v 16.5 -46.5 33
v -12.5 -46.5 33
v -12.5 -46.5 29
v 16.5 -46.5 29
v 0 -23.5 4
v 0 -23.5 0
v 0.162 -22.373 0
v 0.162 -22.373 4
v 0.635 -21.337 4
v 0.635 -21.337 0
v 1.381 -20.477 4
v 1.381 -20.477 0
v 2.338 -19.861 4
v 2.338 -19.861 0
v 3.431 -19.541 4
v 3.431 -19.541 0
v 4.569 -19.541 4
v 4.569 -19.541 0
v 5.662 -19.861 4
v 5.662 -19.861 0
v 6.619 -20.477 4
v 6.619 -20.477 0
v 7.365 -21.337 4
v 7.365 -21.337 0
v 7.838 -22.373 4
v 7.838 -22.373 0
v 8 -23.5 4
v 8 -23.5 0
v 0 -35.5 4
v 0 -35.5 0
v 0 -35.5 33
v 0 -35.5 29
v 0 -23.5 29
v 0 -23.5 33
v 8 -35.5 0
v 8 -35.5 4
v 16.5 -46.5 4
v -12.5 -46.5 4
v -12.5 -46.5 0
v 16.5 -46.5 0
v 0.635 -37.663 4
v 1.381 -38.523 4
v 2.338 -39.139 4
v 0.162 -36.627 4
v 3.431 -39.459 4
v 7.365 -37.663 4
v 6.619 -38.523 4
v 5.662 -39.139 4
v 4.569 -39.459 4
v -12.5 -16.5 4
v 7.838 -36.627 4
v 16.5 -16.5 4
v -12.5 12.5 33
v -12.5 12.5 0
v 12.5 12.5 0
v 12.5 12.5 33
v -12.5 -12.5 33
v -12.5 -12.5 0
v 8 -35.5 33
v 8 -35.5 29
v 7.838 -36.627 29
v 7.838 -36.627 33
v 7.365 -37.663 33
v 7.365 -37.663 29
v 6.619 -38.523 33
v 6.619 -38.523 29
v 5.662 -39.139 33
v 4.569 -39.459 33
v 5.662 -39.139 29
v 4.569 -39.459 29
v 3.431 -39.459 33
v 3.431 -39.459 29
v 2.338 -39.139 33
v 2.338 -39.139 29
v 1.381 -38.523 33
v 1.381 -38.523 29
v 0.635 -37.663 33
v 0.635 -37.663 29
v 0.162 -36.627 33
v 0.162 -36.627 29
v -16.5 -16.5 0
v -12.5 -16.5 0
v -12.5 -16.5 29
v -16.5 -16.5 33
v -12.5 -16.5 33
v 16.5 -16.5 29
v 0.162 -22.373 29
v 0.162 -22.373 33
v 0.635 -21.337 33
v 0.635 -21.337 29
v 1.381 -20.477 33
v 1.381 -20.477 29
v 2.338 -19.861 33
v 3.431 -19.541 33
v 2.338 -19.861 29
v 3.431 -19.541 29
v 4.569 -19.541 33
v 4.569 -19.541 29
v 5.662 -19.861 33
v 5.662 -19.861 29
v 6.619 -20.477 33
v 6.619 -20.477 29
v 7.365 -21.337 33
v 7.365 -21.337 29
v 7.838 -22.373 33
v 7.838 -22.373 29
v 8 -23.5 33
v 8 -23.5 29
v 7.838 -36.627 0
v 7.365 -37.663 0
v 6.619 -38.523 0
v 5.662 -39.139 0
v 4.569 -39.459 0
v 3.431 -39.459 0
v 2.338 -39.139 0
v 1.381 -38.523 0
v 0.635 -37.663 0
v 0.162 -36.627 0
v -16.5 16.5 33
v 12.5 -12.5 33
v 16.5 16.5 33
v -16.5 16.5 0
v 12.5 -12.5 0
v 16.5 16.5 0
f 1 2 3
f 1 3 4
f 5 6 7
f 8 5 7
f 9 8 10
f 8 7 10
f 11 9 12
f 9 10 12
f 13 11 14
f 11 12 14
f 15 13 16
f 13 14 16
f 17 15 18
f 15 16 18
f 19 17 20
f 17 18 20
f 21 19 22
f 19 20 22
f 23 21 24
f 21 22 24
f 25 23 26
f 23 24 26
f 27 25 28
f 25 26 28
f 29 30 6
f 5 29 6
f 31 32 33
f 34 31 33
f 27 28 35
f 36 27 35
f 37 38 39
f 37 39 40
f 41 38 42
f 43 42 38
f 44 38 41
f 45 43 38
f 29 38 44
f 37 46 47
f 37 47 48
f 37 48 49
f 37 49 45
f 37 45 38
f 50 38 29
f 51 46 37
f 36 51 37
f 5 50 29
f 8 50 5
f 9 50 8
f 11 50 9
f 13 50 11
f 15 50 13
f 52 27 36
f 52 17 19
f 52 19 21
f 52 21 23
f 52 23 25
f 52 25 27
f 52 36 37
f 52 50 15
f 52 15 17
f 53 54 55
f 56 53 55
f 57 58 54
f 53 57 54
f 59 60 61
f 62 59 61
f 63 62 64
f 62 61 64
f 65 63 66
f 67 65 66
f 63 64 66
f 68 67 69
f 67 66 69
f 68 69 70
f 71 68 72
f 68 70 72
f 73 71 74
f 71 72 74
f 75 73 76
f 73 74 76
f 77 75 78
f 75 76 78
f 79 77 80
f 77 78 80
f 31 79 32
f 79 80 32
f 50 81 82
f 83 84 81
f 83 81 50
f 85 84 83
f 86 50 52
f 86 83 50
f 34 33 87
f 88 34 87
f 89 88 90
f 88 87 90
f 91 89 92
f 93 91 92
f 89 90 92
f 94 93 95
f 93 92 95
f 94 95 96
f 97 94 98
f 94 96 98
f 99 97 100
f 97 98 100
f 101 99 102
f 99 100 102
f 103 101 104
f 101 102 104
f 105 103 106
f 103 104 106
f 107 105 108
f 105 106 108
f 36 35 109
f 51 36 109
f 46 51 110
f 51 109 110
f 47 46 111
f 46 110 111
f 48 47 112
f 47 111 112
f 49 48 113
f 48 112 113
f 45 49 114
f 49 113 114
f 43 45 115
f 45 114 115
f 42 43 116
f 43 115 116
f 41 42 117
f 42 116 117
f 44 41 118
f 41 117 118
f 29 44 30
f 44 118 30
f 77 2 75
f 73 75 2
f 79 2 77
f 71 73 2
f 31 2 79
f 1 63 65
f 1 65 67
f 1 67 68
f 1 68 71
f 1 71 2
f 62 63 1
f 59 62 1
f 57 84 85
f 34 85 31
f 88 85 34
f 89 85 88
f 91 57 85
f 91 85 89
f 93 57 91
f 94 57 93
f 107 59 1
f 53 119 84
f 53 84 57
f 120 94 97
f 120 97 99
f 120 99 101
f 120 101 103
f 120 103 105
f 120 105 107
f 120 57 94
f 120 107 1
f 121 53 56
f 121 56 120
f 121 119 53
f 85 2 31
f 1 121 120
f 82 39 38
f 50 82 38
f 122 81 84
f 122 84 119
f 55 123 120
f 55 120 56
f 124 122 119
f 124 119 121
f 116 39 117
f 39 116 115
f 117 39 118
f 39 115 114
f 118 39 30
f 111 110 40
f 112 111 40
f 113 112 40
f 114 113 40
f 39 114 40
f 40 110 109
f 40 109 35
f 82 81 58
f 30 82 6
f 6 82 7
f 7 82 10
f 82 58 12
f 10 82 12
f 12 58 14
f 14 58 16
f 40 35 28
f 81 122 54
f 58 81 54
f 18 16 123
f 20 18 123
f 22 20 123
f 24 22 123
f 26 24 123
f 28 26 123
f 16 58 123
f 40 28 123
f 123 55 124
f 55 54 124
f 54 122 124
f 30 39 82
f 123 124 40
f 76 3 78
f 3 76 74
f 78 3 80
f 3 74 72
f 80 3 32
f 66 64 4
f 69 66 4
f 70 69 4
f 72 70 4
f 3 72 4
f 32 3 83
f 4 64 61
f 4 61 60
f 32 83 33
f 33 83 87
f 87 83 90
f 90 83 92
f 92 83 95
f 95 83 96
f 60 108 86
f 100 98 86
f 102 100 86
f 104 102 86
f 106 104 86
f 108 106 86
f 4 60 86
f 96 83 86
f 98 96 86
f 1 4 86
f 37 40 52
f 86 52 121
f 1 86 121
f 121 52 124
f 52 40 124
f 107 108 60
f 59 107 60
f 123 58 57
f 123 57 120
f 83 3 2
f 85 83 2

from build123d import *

# Parameters (mm, degrees)
SKETCH20_W                = 33
SKETCH20_H                = 33
SKETCH20_W_2              = 25
SKETCH20_H_2              = 25
BOSS_EXTRUDE12_DEPTH      = 33
BOSS_EXTRUDE13_DEPTH      = 30
BOSS_EXTRUDE13_DEPTH_BACK = 4
SKETCH22_W                = 33
SKETCH22_H                = 4
SKETCH23_W                = 4
SKETCH23_H                = 4
CUT_EXTRUDE10_DEPTH       = 30
CUT_EXTRUDE15_DEPTH       = 33


with BuildPart() as part:
    # Sketch20 → Boss-Extrude12 (new body)
    with BuildSketch(Plane.XY):
        Rectangle(SKETCH20_W, SKETCH20_H)
        Rectangle(SKETCH20_W_2, SKETCH20_H_2, mode=Mode.SUBTRACT)
    extrude(amount=BOSS_EXTRUDE12_DEPTH)

    # Sketch22 → Boss-Extrude13 (add, two sides: drawn at the far end of the back side and taken through both)
    with BuildSketch(Plane.XZ.offset(16.5).offset(-BOSS_EXTRUDE13_DEPTH_BACK)):
        with Locations((0, 31)):
            Rectangle(SKETCH22_W, SKETCH22_H)
        with Locations((0, 2)):
            Rectangle(SKETCH22_W, SKETCH22_H)
    extrude(amount=BOSS_EXTRUDE13_DEPTH + BOSS_EXTRUDE13_DEPTH_BACK)

    # Sketch23 → Cut-Extrude10 (cut)
    with BuildSketch(Plane.XZ.offset(46.5)):
        with Locations((-14.5, 31)):
            Rectangle(SKETCH23_W, SKETCH23_H)
        with Locations((-14.5, 2)):
            Rectangle(SKETCH23_W, SKETCH23_H)
    extrude(amount=-CUT_EXTRUDE10_DEPTH, mode=Mode.SUBTRACT)

    # Sketch36 → Cut-Extrude15 (cut)
    with BuildSketch(Plane(origin=(0, 0, 0), x_dir=(-1, 0, 0), z_dir=(0, 0, -1))):
        with BuildLine():
            Line((-8, -23.5), (-8, -35.5))
            ThreePointArc((-8, -35.5), (-4, -39.5), (0, -35.5))
            Line((0, -35.5), (0, -23.5))
            ThreePointArc((0, -23.5), (-4, -19.5), (-8, -23.5))
        make_face()
    extrude(amount=-CUT_EXTRUDE15_DEPTH, mode=Mode.SUBTRACT)


solid = part.part
